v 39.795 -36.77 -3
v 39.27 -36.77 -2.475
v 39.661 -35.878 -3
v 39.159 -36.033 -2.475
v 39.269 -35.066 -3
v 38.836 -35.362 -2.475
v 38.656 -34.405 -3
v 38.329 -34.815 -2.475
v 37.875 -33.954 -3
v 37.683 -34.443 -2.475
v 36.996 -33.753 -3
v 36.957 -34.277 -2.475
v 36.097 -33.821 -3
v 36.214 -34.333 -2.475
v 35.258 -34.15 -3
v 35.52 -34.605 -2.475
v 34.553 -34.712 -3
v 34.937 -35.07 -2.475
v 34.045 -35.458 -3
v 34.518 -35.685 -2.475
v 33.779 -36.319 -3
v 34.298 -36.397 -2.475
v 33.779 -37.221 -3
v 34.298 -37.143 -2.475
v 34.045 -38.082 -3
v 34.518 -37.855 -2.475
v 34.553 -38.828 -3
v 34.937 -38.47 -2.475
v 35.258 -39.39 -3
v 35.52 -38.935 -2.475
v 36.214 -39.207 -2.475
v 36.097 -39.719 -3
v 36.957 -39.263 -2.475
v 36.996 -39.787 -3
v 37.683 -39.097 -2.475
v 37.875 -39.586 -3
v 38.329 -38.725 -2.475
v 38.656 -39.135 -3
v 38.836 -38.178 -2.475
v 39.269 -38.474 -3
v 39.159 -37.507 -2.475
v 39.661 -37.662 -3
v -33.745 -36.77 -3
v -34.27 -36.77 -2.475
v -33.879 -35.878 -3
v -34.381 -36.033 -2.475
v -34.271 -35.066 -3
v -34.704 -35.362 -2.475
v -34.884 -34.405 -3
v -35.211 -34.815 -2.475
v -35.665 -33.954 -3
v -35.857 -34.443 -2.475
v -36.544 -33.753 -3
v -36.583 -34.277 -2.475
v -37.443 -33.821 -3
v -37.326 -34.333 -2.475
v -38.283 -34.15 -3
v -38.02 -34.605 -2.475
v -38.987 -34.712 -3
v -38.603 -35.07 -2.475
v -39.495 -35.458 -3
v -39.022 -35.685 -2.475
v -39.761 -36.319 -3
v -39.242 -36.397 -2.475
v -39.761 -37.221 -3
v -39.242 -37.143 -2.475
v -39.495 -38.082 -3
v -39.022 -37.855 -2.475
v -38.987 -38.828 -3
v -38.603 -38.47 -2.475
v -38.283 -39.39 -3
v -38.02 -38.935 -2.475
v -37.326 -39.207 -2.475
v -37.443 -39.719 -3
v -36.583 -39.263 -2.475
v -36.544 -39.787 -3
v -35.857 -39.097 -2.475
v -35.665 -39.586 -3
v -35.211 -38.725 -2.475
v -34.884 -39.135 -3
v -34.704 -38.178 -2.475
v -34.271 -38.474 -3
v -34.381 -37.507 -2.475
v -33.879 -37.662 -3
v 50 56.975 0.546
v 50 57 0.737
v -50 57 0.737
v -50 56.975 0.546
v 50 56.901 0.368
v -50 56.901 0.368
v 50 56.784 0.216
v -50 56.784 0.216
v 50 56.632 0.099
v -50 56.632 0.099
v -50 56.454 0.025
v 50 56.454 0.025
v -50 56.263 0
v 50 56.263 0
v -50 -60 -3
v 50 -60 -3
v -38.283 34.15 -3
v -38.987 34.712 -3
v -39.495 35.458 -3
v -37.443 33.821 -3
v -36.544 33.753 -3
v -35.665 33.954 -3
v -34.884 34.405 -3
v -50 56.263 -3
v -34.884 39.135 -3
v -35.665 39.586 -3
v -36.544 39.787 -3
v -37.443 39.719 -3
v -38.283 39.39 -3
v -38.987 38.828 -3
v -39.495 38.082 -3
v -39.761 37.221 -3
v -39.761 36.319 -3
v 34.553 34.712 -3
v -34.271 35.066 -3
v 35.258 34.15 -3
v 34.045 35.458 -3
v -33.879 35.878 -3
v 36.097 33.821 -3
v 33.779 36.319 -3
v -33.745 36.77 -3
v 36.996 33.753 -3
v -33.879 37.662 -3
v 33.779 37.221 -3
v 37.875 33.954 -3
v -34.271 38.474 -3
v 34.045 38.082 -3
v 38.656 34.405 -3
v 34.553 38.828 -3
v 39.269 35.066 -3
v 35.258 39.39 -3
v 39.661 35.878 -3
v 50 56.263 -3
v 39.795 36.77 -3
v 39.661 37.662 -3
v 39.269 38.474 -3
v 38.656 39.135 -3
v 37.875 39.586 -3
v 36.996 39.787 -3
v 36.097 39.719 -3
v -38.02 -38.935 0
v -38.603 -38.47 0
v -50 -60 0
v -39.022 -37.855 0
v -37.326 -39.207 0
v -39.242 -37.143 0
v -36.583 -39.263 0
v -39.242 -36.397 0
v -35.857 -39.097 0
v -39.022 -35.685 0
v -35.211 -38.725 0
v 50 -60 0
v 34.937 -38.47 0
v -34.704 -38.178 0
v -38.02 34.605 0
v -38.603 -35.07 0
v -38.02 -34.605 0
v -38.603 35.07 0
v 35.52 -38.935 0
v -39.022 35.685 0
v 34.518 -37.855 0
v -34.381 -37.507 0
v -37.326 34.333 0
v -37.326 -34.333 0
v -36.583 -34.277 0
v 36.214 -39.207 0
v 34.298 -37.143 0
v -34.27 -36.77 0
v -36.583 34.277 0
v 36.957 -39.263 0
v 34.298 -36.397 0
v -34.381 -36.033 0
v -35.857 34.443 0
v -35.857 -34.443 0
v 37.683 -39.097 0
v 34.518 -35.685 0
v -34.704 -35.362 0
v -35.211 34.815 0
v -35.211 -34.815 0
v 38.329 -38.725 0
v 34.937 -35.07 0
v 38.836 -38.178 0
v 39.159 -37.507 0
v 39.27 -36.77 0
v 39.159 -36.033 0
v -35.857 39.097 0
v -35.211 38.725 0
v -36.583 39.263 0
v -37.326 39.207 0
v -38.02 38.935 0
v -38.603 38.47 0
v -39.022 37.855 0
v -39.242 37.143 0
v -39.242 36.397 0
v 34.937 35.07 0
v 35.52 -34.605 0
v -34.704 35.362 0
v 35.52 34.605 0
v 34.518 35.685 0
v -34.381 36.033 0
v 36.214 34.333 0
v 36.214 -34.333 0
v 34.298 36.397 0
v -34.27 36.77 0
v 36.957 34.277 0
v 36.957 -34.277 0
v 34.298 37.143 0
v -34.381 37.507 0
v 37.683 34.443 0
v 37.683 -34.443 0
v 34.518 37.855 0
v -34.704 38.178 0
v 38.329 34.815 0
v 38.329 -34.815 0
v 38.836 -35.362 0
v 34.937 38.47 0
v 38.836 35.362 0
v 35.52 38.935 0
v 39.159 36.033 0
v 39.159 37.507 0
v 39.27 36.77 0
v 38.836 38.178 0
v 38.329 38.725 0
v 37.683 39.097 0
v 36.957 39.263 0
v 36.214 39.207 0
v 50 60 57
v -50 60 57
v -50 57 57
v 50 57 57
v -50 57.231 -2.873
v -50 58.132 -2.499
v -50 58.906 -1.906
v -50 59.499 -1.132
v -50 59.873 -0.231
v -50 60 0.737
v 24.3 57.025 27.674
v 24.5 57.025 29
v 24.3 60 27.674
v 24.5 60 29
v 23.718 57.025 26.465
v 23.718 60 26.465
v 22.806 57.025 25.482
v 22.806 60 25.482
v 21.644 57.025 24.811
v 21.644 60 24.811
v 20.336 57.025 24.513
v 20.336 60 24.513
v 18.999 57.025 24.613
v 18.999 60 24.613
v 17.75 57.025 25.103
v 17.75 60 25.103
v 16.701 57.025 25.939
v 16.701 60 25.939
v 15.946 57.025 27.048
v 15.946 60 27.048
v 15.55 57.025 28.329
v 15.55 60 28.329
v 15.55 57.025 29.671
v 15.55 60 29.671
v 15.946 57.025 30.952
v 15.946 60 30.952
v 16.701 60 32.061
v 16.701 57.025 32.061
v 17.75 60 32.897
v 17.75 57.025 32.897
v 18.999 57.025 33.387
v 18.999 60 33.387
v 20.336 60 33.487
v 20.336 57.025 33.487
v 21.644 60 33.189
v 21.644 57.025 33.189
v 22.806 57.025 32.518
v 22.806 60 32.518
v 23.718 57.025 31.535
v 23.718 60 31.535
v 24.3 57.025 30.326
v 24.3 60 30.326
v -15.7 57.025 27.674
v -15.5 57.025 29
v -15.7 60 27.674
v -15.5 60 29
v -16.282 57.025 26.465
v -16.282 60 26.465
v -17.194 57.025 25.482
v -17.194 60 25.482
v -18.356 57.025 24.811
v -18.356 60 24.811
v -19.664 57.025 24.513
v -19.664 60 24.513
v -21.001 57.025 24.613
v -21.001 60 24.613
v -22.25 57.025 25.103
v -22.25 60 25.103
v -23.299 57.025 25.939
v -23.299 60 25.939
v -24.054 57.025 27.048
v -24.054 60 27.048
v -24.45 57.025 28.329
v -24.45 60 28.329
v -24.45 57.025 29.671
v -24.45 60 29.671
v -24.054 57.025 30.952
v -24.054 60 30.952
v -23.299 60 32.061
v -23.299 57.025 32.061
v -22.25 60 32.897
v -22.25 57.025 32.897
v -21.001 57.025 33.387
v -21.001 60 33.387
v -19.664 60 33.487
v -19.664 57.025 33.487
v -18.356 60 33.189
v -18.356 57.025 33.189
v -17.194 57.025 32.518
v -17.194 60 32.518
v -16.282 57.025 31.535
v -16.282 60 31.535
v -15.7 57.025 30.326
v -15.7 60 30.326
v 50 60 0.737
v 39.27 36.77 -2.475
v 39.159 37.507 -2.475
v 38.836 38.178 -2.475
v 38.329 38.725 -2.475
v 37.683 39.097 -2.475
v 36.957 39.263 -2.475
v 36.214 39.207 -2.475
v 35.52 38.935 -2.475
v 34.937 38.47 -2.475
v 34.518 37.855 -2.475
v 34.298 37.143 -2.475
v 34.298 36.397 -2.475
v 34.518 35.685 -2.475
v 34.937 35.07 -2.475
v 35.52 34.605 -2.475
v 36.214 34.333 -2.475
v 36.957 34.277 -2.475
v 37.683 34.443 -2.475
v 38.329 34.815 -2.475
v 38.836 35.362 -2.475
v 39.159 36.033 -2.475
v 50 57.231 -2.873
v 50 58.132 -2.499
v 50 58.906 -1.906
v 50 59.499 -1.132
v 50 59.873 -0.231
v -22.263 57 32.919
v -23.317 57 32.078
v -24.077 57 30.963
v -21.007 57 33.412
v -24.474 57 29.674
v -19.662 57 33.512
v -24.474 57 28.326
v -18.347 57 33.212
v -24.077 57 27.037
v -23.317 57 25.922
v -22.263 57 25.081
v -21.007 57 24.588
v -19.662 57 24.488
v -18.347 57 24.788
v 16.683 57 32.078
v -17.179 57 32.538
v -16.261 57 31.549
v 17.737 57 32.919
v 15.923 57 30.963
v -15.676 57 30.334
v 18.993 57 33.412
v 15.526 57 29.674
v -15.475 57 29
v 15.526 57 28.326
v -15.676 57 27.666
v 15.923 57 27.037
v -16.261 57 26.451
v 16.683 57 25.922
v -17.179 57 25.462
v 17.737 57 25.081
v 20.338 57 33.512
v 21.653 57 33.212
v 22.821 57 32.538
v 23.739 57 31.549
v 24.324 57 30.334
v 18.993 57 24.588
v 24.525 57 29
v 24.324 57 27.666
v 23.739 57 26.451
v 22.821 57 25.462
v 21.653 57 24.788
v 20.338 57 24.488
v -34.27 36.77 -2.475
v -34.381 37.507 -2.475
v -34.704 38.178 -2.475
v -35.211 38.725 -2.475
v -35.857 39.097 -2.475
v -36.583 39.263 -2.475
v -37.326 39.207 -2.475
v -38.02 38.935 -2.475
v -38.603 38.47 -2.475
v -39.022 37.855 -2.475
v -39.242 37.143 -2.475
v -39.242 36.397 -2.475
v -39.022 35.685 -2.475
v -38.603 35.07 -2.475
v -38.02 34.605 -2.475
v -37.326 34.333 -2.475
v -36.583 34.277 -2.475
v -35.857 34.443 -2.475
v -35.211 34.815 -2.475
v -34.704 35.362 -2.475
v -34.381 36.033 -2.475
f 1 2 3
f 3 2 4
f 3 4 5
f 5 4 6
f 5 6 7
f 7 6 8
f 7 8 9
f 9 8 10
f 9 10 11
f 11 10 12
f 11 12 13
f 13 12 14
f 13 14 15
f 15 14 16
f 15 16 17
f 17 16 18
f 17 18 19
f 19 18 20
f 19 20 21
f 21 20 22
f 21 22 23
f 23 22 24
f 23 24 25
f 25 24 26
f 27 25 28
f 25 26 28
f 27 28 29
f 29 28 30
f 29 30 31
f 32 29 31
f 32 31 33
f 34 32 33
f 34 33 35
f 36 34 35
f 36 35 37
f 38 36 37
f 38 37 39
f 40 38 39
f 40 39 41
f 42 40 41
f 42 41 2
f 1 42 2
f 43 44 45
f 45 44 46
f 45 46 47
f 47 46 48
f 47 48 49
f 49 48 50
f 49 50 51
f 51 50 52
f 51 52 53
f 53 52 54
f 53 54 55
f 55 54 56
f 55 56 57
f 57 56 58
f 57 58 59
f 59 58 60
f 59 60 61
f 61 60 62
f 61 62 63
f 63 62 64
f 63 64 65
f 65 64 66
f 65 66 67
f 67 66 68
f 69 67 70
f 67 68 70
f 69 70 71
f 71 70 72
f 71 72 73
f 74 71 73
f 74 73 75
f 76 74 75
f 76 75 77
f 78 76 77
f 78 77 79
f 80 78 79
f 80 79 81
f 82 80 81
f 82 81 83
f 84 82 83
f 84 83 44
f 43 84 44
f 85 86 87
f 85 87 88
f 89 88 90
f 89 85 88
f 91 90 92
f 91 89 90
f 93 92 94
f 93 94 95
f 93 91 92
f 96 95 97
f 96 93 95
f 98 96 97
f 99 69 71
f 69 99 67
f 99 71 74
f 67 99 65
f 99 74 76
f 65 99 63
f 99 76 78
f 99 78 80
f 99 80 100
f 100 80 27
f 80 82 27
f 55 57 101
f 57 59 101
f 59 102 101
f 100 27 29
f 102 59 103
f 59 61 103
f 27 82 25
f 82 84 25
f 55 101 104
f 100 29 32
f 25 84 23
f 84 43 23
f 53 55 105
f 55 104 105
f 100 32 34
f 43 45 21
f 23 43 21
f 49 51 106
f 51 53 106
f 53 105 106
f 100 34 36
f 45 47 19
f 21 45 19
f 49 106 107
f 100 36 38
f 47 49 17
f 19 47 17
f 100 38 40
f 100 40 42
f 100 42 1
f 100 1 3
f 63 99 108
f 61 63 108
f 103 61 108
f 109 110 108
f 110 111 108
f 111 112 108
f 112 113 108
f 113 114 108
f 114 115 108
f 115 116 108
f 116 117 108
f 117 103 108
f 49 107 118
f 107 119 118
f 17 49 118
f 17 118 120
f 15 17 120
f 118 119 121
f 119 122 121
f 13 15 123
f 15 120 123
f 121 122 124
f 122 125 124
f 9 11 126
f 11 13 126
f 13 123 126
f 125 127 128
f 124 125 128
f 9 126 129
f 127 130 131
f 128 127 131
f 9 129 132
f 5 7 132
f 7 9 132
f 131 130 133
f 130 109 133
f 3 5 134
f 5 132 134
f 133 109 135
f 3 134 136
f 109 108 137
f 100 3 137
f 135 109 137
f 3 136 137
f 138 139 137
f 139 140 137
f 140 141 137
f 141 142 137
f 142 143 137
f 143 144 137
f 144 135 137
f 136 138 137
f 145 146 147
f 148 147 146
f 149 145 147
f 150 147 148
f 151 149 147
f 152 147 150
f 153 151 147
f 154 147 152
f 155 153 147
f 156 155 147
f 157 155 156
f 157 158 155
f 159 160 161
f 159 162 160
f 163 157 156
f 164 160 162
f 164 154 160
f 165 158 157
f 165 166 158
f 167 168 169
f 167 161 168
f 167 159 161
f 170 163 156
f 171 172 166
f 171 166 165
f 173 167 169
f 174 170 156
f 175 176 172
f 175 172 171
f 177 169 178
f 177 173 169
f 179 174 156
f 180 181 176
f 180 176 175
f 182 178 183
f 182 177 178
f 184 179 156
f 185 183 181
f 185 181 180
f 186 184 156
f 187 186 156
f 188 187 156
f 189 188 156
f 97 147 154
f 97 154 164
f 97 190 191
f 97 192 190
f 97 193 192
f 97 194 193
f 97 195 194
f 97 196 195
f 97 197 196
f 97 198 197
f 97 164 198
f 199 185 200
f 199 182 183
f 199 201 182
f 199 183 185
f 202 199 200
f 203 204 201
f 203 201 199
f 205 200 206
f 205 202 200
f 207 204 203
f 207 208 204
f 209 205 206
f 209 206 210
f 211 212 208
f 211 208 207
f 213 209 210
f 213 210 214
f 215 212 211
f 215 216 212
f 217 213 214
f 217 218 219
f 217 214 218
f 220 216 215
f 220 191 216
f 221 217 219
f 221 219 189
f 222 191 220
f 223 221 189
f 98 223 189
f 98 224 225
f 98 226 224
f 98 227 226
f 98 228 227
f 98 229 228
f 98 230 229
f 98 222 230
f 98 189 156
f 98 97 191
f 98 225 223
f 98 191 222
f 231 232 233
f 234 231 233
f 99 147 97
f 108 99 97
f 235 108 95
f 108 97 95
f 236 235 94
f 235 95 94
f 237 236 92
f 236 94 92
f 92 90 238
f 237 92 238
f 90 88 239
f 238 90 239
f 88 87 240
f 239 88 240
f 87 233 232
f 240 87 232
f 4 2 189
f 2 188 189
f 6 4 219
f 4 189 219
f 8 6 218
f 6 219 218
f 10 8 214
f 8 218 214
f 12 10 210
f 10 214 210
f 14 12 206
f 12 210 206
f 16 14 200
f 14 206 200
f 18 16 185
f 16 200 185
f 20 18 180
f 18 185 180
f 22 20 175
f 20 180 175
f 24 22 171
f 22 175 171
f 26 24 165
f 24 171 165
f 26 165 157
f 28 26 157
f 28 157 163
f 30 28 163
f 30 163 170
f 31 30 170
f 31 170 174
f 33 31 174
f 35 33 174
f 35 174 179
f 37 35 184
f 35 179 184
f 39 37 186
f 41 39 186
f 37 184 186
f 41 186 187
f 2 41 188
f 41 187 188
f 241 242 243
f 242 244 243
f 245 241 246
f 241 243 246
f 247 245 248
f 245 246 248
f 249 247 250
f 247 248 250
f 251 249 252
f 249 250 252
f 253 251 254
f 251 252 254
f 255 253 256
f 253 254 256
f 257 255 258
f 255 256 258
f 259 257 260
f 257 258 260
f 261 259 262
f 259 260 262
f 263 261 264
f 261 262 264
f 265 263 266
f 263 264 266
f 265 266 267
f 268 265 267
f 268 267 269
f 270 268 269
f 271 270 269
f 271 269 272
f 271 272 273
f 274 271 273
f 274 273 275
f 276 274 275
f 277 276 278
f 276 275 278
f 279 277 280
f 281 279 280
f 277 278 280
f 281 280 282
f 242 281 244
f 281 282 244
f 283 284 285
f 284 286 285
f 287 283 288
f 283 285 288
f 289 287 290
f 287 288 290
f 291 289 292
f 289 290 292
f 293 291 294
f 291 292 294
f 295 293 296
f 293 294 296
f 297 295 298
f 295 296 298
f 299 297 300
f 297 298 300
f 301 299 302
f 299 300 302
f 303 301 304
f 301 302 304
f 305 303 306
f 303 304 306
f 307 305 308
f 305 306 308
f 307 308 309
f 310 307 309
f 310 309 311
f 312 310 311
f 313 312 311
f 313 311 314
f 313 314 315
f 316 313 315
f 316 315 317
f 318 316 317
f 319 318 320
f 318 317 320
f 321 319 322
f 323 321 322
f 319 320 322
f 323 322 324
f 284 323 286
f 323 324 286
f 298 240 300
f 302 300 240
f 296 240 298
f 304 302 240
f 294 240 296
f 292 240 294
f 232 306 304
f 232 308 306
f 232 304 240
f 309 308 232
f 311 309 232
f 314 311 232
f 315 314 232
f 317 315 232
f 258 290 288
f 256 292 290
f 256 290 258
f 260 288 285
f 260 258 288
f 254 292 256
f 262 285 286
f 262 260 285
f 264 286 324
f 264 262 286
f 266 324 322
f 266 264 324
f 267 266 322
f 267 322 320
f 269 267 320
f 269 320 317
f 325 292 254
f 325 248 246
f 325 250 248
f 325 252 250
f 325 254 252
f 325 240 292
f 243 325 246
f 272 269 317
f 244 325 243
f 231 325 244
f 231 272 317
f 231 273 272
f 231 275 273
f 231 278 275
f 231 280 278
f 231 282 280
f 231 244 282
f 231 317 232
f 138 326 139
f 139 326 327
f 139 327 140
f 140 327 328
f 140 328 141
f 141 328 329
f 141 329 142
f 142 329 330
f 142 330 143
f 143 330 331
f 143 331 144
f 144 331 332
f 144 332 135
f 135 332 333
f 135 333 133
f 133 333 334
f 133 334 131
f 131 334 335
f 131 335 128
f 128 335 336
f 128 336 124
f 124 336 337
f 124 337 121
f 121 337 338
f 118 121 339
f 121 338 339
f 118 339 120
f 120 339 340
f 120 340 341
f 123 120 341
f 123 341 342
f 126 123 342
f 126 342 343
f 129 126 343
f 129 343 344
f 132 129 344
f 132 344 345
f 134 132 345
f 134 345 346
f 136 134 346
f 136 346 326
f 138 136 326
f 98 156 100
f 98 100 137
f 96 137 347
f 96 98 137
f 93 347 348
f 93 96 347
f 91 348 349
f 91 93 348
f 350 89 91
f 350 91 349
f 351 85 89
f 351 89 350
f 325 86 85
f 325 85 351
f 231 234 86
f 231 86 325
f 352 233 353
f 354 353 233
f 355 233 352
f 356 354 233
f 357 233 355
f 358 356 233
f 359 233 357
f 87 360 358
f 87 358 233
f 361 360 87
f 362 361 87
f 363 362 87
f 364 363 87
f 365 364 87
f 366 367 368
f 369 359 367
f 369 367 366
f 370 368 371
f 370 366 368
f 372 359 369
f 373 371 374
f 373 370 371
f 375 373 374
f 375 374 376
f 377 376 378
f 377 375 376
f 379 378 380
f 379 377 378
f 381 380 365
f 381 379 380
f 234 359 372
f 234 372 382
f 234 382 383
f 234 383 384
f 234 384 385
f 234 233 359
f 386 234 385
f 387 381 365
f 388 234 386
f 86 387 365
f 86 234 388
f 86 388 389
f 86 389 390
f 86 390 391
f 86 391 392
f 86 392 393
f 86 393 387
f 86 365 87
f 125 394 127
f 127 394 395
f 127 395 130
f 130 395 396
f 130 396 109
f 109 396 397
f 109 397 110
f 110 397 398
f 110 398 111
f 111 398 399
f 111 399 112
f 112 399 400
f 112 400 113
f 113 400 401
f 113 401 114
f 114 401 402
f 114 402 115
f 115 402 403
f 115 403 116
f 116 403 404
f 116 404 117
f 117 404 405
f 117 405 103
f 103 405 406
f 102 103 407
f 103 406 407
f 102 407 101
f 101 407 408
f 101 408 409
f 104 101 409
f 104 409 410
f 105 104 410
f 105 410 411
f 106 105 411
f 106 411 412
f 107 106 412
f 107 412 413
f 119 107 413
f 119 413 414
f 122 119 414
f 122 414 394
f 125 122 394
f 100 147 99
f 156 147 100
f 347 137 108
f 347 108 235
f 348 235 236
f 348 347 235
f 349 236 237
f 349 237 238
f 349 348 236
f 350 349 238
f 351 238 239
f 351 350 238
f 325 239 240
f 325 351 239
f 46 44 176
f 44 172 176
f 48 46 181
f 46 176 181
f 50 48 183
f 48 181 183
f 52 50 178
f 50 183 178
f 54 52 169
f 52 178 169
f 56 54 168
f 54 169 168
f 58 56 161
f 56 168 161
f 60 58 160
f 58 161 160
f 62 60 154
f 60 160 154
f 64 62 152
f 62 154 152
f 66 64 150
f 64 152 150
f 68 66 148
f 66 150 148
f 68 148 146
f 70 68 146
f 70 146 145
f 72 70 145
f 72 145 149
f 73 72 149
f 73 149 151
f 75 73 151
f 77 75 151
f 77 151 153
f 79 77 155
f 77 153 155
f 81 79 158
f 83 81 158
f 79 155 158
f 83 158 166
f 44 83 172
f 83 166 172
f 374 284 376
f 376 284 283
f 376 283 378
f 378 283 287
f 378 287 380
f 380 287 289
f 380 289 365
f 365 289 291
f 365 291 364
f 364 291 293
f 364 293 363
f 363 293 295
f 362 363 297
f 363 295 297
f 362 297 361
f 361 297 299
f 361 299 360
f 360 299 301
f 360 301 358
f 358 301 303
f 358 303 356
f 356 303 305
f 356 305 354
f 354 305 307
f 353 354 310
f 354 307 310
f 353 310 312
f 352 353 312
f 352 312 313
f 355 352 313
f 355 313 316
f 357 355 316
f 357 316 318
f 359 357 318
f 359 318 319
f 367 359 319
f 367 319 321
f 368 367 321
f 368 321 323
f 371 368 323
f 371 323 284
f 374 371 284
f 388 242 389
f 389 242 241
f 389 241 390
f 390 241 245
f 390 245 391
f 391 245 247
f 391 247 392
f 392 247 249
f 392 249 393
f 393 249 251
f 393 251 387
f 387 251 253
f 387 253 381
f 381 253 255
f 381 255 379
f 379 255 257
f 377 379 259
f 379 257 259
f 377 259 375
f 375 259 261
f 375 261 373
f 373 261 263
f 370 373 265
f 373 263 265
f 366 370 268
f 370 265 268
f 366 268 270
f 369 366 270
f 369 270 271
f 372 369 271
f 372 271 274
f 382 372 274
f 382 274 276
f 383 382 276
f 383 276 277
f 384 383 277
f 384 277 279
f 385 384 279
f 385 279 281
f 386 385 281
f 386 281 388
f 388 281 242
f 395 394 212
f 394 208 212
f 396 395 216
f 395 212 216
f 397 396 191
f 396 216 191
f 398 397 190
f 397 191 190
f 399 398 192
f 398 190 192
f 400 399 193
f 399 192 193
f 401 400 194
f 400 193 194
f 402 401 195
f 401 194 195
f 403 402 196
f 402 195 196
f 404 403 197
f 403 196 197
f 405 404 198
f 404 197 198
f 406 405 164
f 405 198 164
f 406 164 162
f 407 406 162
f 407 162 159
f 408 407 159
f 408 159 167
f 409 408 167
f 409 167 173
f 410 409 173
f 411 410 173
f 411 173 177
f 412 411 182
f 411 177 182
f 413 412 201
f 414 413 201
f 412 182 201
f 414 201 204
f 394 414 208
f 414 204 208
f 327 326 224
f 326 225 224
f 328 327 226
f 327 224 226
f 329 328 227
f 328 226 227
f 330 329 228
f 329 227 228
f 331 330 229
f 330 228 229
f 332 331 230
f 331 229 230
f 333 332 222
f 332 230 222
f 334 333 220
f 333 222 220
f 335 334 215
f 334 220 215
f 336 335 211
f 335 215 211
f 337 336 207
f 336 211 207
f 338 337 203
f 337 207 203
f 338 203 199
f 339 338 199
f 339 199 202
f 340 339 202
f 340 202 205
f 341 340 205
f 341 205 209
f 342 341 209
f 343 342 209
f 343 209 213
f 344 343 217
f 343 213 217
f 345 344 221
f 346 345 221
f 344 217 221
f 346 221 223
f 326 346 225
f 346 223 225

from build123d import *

# Parameters (mm, degrees)
SKETCH_1_W                       = 100
SKETCH_1_H                       = 120
SM_BASE_FLANGE_1_DEPTH           = 3
SM_EDGE_FLANGE_1_STRIP_W         = 13.4732
SM_EDGE_FLANGE_1_STRIP_H         = 3
SM_EDGE_FLANGE_1_STRIP_CUT_DEPTH = 100
SM_EDGE_FLANGE_1_DEPTH           = 100
HOLE_WIZARD_M6_2_D               = 5
HOLE_WIZARD_M6_2_DEPTH           = 15
HOLE_WIZARD_M6_2_CSINK_D         = 6.05
HOLE_WIZARD_M6_2_CSINK_ANGLE     = 90
HOLE_WIZARD_M6_2_TIP             = 1.502151548
HOLE_WIZARD_M8_1_D               = 9
HOLE_WIZARD_M8_1_DEPTH           = 15
HOLE_WIZARD_M8_1_CSINK_D         = 9.05
HOLE_WIZARD_M8_1_CSINK_ANGLE     = 90
HOLE_WIZARD_M8_1_TIP             = 2.703872786


# Sheet-metal steps are written as plain solids
with BuildPart() as part:
    # Sketch 1 → 基体-法兰1 (new body)
    with BuildSketch(Plane.XY):
        Rectangle(SKETCH_1_W, SKETCH_1_H)
    extrude(amount=-SM_BASE_FLANGE_1_DEPTH)

    # 边线-法兰1 strip (across the edge) → 边线-法兰1 strip cut (cut)
    with BuildSketch(Plane(origin=(50, 60, 0), x_dir=(0, -1, 0), z_dir=(-1, 0, 0))):
        with Locations((-3, -1.5)):
            Rectangle(SM_EDGE_FLANGE_1_STRIP_W, SM_EDGE_FLANGE_1_STRIP_H)
    extrude(amount=SM_EDGE_FLANGE_1_STRIP_CUT_DEPTH, mode=Mode.SUBTRACT)

    # 边线-法兰1 section (across the edge) → 边线-法兰1 (add)
    with BuildSketch(Plane(origin=(50, 60, 0), x_dir=(0, -1, 0), z_dir=(-1, 0, 0))):
        with BuildLine():
            Line((0, 0.7366), (0, 57))
            Line((0, 57), (3, 57))
            Line((3, 57), (3, 0.7366))
            ThreePointArc((3, 0.7366), (3.215745145, 0.215745145), (3.7366, 0))
            Line((3.7366, 0), (3.7366, -3))
            ThreePointArc((3.7366, -3), (1.094424801, -1.905575199), (0, 0.7366))
        make_face()
    extrude(amount=SM_EDGE_FLANGE_1_DEPTH)

    # M6 螺纹孔2
    with Locations(Plane(origin=(0, 0, -3), x_dir=(-1, 0, 0), z_dir=(0, 0, -1))):
        with Locations((-36.77, 36.77), (36.77, 36.77), (36.77, -36.77), (-36.77, -36.77)):
            CounterSinkHole(HOLE_WIZARD_M6_2_D / 2, HOLE_WIZARD_M6_2_CSINK_D / 2, depth=HOLE_WIZARD_M6_2_DEPTH, counter_sink_angle=HOLE_WIZARD_M6_2_CSINK_ANGLE)
            with Locations((0, 0, -(HOLE_WIZARD_M6_2_DEPTH + HOLE_WIZARD_M6_2_TIP / 2))):  # 118° drill point
                Cone(0, HOLE_WIZARD_M6_2_D / 2, HOLE_WIZARD_M6_2_TIP, mode=Mode.SUBTRACT)

    # M8 间隙孔1
    with Locations(Plane(origin=(0, 57, 0), x_dir=(-1, 0, 0), z_dir=(0, -1, 0))):
        with Locations((20, -29), (-20, -29)):
            CounterSinkHole(HOLE_WIZARD_M8_1_D / 2, HOLE_WIZARD_M8_1_CSINK_D / 2, depth=HOLE_WIZARD_M8_1_DEPTH, counter_sink_angle=HOLE_WIZARD_M8_1_CSINK_ANGLE)
            with Locations((0, 0, -(HOLE_WIZARD_M8_1_DEPTH + HOLE_WIZARD_M8_1_TIP / 2))):  # 118° drill point
                Cone(0, HOLE_WIZARD_M8_1_D / 2, HOLE_WIZARD_M8_1_TIP, mode=Mode.SUBTRACT)


solid = part.part
